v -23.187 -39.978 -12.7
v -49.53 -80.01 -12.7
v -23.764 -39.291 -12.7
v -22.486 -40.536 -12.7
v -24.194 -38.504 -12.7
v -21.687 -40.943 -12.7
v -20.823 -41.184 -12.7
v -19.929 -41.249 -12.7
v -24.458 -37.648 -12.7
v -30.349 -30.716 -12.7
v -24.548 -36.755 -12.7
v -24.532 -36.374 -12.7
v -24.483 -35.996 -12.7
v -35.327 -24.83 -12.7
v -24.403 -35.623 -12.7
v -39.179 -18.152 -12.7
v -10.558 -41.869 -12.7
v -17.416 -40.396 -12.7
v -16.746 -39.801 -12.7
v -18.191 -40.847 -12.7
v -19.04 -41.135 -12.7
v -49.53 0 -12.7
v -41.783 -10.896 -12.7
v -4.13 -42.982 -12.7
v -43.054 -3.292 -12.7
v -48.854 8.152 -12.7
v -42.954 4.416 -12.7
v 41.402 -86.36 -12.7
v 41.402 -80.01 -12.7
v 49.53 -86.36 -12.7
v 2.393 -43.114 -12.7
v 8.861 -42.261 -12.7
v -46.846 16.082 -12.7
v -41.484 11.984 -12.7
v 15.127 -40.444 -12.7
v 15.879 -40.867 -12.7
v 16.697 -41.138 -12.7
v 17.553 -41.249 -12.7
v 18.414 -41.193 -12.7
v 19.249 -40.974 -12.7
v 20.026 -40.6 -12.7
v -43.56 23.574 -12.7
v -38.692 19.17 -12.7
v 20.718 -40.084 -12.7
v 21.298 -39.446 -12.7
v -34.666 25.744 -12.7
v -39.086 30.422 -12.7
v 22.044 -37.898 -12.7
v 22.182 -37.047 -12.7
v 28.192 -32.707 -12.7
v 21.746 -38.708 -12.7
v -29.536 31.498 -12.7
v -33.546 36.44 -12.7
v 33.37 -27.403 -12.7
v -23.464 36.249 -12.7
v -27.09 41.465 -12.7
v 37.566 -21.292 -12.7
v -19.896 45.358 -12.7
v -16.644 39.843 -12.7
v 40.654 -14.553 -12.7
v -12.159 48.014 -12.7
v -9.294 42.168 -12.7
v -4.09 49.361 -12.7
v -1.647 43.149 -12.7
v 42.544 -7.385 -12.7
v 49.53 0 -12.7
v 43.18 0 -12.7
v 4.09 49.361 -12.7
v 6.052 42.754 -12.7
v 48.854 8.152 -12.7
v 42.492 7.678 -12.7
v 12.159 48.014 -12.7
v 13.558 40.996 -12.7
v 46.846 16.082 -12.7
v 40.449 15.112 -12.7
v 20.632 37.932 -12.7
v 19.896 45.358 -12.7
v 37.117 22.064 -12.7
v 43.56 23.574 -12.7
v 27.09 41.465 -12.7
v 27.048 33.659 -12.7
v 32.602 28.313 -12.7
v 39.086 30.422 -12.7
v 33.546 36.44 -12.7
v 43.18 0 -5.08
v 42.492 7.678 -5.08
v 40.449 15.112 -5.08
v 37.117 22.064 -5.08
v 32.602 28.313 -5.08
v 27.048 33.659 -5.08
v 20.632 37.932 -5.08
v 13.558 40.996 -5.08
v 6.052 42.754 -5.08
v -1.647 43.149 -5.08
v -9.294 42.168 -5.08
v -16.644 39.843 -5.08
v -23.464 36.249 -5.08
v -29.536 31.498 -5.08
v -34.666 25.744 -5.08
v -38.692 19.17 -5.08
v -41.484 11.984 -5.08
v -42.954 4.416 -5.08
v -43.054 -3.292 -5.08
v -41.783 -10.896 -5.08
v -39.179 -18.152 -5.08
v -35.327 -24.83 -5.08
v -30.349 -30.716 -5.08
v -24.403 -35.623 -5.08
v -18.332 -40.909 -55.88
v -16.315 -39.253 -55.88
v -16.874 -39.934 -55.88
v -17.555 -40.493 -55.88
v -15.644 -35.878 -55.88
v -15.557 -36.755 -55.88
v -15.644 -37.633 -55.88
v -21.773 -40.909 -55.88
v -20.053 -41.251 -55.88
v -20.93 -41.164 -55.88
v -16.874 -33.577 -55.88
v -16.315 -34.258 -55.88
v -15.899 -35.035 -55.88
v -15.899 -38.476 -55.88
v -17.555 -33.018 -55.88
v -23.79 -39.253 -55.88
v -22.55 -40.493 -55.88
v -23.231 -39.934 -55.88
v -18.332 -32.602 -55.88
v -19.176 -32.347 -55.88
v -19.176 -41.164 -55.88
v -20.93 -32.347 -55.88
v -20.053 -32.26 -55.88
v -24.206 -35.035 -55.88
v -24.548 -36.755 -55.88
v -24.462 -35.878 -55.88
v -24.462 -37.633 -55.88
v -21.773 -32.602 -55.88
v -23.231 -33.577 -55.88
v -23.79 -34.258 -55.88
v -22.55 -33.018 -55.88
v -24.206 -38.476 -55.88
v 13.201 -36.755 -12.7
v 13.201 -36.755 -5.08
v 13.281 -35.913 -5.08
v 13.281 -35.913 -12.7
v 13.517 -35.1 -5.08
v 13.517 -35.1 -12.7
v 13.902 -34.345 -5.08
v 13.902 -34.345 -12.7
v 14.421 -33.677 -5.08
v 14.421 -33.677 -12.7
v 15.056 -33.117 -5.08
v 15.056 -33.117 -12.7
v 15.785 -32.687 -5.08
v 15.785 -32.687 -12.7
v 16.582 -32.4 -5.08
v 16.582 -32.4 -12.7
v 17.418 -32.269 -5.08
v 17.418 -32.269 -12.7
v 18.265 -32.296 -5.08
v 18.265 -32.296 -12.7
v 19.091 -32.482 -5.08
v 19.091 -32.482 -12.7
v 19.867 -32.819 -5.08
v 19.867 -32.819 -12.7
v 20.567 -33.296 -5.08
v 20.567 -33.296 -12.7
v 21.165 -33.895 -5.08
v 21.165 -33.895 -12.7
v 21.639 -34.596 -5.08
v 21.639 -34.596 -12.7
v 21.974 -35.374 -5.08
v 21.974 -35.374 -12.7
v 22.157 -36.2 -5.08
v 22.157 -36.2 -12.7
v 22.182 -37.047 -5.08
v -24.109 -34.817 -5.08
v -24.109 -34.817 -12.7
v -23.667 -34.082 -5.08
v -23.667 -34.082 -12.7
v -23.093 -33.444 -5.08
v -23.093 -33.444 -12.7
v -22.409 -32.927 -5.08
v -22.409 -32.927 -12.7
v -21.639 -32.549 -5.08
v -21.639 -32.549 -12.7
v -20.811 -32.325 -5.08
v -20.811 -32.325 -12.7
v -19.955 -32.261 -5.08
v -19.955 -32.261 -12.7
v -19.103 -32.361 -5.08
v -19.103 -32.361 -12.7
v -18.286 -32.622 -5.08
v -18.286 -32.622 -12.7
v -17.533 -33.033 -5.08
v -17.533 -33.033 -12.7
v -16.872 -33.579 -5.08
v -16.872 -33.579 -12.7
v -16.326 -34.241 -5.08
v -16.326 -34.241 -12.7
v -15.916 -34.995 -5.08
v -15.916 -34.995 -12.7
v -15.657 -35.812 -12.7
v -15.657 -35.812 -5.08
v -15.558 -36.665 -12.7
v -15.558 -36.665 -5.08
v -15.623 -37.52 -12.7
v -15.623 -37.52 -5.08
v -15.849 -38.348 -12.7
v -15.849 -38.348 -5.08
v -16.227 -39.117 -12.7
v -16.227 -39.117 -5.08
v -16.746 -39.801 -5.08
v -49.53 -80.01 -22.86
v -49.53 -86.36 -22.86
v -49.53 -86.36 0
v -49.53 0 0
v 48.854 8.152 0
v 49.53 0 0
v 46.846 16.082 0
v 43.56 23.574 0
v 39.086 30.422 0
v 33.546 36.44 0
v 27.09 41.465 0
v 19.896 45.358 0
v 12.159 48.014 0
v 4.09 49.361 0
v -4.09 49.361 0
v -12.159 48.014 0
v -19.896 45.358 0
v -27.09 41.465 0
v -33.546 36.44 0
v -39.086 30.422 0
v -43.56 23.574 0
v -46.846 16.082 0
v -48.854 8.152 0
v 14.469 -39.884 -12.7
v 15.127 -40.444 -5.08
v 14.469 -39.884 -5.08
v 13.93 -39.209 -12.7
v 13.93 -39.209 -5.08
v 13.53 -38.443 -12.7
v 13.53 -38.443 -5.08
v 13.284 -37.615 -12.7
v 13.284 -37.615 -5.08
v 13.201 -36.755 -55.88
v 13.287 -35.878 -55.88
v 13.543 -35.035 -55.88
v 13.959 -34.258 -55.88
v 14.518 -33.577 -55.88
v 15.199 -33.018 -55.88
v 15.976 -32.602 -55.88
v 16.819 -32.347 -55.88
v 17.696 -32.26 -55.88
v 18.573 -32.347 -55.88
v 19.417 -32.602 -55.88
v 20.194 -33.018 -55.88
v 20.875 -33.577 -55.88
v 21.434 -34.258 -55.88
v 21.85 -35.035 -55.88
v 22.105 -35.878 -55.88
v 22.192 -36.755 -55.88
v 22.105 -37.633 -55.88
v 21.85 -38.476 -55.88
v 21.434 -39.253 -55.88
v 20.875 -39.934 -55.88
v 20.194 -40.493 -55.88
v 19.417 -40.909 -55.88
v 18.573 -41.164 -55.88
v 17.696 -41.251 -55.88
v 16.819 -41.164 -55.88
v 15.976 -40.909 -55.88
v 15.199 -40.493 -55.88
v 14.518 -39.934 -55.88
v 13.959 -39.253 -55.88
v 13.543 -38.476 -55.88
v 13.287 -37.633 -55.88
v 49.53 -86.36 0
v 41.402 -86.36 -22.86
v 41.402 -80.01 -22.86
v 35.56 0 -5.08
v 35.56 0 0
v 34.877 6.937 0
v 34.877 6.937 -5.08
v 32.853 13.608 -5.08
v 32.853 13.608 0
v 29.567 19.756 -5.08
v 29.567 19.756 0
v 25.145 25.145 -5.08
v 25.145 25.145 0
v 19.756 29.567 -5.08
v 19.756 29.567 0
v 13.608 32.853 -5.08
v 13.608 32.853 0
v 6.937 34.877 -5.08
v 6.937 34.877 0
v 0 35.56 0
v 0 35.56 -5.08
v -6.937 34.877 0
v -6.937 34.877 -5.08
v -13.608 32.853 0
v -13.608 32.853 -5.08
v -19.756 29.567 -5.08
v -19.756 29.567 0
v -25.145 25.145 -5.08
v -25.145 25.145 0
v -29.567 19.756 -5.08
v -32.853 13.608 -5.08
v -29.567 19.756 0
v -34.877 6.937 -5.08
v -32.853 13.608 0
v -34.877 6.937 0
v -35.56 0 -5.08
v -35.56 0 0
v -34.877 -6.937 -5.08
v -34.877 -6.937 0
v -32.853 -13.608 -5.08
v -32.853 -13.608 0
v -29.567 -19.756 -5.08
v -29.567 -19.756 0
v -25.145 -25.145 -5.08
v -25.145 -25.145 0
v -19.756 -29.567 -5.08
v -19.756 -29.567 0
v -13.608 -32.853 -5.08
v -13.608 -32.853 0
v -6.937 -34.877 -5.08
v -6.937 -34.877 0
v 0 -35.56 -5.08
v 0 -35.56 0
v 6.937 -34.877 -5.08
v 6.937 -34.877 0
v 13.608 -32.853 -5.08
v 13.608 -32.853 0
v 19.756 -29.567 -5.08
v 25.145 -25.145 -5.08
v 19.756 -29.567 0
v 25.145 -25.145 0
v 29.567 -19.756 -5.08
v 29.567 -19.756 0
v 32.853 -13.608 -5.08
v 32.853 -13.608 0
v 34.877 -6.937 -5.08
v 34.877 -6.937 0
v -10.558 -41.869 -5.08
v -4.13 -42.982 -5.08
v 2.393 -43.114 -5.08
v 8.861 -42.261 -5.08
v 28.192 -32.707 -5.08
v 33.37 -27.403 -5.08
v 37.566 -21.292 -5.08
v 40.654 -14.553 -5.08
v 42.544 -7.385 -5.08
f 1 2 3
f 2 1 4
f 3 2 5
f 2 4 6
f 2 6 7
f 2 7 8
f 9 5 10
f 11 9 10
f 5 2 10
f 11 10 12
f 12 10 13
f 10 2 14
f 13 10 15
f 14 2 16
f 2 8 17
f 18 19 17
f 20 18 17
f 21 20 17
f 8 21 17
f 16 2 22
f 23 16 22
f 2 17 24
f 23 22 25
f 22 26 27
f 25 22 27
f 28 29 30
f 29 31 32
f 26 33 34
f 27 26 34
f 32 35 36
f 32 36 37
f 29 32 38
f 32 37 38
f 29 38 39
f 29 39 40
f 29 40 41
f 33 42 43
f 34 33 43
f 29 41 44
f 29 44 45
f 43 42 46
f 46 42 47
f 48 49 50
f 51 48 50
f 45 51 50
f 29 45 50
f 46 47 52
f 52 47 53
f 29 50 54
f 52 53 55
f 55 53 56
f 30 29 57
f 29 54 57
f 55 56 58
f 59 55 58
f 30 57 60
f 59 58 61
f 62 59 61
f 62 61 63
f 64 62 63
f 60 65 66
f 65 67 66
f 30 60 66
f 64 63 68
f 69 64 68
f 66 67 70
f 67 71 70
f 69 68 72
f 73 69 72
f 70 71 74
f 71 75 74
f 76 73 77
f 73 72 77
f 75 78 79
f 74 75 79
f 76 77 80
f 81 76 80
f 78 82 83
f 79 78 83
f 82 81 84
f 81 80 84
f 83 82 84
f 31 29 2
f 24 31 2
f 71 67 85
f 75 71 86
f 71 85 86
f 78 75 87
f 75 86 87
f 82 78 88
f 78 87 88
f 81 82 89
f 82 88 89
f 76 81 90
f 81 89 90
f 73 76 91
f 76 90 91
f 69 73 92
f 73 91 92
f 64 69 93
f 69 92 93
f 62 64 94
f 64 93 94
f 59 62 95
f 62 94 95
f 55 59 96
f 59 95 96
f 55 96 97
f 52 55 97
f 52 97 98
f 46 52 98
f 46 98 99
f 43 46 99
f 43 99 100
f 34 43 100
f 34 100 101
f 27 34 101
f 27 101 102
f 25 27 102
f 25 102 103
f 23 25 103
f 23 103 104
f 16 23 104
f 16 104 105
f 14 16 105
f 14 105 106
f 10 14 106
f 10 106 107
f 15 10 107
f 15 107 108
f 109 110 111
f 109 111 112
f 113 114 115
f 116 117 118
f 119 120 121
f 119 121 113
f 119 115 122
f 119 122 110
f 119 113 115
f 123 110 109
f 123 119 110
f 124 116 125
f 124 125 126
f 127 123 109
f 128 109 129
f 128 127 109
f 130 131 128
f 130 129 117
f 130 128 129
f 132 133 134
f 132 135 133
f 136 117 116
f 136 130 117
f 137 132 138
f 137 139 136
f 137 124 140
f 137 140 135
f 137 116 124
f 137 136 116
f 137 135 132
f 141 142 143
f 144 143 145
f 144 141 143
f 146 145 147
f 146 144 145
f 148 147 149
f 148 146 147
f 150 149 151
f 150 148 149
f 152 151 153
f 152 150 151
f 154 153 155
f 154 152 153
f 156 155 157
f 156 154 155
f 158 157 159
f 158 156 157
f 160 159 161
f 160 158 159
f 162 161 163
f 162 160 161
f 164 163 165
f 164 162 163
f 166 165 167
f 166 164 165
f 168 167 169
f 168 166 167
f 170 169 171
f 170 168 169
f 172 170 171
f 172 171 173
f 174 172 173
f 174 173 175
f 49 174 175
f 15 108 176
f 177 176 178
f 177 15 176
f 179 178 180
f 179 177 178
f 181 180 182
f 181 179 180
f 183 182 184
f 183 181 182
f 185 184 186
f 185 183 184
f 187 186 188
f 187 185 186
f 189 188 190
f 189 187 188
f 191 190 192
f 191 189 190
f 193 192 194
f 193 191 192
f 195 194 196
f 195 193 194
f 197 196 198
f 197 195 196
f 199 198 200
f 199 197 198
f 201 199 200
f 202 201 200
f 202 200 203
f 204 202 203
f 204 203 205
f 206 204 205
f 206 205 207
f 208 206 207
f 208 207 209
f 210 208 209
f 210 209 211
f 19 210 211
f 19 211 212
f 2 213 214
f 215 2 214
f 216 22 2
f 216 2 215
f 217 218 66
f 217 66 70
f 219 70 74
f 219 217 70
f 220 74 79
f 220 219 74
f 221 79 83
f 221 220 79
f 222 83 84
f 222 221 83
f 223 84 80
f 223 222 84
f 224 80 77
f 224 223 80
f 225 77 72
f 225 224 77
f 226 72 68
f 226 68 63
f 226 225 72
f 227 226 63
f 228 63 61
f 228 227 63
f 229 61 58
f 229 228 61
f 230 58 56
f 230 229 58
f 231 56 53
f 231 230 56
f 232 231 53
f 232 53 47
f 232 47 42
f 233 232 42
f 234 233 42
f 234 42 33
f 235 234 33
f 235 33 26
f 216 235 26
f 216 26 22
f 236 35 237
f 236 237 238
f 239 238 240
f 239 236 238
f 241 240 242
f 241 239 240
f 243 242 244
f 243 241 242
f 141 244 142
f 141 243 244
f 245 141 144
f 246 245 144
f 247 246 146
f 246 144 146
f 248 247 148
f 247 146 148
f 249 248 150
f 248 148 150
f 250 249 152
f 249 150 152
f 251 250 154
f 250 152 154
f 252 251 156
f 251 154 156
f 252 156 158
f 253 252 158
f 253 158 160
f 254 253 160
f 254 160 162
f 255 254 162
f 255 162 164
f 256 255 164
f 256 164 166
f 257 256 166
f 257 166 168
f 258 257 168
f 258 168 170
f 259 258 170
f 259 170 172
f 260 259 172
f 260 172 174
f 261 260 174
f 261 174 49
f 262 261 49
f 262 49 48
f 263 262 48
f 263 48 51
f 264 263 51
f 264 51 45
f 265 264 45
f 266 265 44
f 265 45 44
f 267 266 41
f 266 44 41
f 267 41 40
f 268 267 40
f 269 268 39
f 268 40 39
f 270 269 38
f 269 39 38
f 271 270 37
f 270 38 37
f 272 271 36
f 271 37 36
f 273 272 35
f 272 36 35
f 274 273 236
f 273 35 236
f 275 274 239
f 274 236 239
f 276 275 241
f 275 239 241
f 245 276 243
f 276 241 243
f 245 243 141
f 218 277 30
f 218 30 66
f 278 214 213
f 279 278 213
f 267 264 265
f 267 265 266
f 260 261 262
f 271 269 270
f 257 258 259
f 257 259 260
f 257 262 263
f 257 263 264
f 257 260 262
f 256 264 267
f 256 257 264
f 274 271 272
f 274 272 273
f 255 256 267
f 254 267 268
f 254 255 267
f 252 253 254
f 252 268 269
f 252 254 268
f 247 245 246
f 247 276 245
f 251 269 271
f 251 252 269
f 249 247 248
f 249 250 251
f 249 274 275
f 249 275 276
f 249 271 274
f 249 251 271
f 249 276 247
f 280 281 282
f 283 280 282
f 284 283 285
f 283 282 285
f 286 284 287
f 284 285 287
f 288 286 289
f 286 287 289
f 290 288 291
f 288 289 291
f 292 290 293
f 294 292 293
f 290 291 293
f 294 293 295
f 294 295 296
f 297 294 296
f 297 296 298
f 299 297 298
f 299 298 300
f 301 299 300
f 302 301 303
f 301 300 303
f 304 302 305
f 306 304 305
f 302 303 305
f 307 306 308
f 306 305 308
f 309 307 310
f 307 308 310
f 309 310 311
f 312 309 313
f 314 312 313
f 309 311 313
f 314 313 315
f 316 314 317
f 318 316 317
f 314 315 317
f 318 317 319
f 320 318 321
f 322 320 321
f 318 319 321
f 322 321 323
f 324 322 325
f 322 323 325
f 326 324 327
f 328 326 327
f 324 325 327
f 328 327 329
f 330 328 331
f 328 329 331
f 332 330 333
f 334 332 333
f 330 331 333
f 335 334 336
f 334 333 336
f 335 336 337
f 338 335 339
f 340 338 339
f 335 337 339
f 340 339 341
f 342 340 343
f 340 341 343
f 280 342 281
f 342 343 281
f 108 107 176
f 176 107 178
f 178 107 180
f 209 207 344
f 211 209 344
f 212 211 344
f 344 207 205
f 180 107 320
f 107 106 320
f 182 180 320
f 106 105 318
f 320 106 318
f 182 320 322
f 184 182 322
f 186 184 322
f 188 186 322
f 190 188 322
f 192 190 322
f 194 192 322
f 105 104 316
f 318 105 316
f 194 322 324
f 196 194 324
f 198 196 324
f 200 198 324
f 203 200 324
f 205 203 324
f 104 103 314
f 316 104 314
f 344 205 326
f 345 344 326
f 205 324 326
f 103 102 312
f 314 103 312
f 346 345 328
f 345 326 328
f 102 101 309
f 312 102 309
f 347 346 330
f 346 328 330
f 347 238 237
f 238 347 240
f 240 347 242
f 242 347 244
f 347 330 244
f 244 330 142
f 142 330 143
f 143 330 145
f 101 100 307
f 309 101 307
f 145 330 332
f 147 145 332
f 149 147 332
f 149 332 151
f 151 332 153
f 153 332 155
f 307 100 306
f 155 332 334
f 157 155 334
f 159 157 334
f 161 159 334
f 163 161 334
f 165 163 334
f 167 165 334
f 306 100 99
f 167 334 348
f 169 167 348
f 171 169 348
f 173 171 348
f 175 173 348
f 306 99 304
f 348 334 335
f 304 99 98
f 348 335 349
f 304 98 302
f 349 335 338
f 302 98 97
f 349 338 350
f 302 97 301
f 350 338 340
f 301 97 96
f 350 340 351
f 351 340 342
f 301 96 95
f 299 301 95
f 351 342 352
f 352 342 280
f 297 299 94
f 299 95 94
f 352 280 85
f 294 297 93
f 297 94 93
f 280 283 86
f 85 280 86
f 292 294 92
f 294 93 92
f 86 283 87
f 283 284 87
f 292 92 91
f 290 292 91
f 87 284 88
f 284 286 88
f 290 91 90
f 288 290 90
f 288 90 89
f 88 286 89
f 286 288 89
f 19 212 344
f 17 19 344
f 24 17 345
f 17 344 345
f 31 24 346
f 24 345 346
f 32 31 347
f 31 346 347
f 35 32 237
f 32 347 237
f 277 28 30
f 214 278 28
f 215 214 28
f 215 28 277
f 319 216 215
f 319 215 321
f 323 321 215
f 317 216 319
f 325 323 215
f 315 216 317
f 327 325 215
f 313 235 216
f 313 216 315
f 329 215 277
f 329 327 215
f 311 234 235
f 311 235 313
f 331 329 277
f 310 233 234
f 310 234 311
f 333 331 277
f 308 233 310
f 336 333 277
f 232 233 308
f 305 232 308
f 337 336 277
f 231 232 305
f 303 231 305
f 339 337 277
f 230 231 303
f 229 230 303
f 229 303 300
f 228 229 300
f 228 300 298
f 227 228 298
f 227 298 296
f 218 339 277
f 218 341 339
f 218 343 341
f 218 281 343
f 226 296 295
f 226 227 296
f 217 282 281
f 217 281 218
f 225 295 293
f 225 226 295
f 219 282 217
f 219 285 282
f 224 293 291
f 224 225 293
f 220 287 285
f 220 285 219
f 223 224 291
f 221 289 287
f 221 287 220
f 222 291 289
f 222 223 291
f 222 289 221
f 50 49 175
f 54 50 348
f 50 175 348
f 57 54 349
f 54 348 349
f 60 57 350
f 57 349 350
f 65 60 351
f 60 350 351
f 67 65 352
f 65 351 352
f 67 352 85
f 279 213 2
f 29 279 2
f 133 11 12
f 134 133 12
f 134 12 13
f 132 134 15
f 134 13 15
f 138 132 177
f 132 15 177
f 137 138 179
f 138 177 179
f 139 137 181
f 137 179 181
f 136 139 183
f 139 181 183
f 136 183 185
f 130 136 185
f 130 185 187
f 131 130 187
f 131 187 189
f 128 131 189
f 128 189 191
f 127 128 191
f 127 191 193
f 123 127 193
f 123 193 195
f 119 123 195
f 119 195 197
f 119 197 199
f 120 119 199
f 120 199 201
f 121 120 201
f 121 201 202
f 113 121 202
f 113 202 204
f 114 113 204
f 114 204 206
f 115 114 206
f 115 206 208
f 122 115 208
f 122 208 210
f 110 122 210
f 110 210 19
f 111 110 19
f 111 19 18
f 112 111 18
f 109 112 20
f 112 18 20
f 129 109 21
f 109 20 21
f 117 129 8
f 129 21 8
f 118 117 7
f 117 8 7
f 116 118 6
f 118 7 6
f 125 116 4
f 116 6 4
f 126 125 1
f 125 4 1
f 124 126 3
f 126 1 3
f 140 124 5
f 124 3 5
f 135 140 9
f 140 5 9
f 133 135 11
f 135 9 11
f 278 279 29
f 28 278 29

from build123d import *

# Parameters (mm, degrees)
SKETCH1_R                = 43.18
SKETCH1_R_2              = 35.56
BOSS_EXTRUDE1_DEPTH      = 5.08
SKETCH1_4_R              = 49.53
SKETCH1_4_R_2            = 43.18
BOSS_EXTRUDE2_DEPTH      = 12.7
BOSS_EXTRUDE3_DEPTH      = 12.7
SKETCH3_W                = 10.16
SKETCH3_H                = 6.35
BOSS_EXTRUDE4_DEPTH      = 90.932
BOSS_EXTRUDE5_DEPTH      = 43.18
BOSS_EXTRUDE5_DEPTH_BACK = 8.89
SKETCH4_R                = 4.495372053


with BuildPart() as part:
    # Sketch1 → Boss-Extrude1 (new body)
    with BuildSketch(Plane.XY):
        Circle(SKETCH1_R)
        Circle(SKETCH1_R_2, mode=Mode.SUBTRACT)
    extrude(amount=-BOSS_EXTRUDE1_DEPTH)

    # Sketch1<4> → Boss-Extrude2 (add)
    with BuildSketch(Plane.XY):
        Circle(SKETCH1_4_R)
        Circle(SKETCH1_4_R_2, mode=Mode.SUBTRACT)
    extrude(amount=-BOSS_EXTRUDE2_DEPTH)

    # Sketch2 → Boss-Extrude3 (add)
    with BuildSketch(Plane.XY):
        with BuildLine():
            ThreePointArc((49.53, 0), (0, -49.53), (-49.53, 0))
            Line((-49.53, 0), (-49.53, -49.53))
            Line((-49.53, -49.53), (-49.53, -86.36))
            Line((-49.53, -86.36), (0, -86.36))
            Line((0, -86.36), (49.53, -86.36))
            Line((49.53, -86.36), (49.53, 0))
        make_face()
    extrude(amount=-BOSS_EXTRUDE3_DEPTH)

    # Sketch3 → Boss-Extrude4 (add)
    with BuildSketch(Plane.ZY.offset(49.53)):
        with Locations((-17.78, -83.185)):
            Rectangle(SKETCH3_W, SKETCH3_H)
    extrude(amount=-BOSS_EXTRUDE4_DEPTH)

    # Sketch4 → Boss-Extrude5 (add, two sides: drawn at the far end of the back side and taken through both)
    with BuildSketch(Plane(origin=(0, 0, -12.7), x_dir=(-1, 0, 0), z_dir=(0, 0, -1)).offset(-BOSS_EXTRUDE5_DEPTH_BACK)):
        with Locations((-17.696483248, -36.755496611)):
            Circle(SKETCH4_R)
        with Locations((20.052531589, -36.755496611)):
            Circle(SKETCH4_R)
    extrude(amount=BOSS_EXTRUDE5_DEPTH + BOSS_EXTRUDE5_DEPTH_BACK)


solid = part.part
